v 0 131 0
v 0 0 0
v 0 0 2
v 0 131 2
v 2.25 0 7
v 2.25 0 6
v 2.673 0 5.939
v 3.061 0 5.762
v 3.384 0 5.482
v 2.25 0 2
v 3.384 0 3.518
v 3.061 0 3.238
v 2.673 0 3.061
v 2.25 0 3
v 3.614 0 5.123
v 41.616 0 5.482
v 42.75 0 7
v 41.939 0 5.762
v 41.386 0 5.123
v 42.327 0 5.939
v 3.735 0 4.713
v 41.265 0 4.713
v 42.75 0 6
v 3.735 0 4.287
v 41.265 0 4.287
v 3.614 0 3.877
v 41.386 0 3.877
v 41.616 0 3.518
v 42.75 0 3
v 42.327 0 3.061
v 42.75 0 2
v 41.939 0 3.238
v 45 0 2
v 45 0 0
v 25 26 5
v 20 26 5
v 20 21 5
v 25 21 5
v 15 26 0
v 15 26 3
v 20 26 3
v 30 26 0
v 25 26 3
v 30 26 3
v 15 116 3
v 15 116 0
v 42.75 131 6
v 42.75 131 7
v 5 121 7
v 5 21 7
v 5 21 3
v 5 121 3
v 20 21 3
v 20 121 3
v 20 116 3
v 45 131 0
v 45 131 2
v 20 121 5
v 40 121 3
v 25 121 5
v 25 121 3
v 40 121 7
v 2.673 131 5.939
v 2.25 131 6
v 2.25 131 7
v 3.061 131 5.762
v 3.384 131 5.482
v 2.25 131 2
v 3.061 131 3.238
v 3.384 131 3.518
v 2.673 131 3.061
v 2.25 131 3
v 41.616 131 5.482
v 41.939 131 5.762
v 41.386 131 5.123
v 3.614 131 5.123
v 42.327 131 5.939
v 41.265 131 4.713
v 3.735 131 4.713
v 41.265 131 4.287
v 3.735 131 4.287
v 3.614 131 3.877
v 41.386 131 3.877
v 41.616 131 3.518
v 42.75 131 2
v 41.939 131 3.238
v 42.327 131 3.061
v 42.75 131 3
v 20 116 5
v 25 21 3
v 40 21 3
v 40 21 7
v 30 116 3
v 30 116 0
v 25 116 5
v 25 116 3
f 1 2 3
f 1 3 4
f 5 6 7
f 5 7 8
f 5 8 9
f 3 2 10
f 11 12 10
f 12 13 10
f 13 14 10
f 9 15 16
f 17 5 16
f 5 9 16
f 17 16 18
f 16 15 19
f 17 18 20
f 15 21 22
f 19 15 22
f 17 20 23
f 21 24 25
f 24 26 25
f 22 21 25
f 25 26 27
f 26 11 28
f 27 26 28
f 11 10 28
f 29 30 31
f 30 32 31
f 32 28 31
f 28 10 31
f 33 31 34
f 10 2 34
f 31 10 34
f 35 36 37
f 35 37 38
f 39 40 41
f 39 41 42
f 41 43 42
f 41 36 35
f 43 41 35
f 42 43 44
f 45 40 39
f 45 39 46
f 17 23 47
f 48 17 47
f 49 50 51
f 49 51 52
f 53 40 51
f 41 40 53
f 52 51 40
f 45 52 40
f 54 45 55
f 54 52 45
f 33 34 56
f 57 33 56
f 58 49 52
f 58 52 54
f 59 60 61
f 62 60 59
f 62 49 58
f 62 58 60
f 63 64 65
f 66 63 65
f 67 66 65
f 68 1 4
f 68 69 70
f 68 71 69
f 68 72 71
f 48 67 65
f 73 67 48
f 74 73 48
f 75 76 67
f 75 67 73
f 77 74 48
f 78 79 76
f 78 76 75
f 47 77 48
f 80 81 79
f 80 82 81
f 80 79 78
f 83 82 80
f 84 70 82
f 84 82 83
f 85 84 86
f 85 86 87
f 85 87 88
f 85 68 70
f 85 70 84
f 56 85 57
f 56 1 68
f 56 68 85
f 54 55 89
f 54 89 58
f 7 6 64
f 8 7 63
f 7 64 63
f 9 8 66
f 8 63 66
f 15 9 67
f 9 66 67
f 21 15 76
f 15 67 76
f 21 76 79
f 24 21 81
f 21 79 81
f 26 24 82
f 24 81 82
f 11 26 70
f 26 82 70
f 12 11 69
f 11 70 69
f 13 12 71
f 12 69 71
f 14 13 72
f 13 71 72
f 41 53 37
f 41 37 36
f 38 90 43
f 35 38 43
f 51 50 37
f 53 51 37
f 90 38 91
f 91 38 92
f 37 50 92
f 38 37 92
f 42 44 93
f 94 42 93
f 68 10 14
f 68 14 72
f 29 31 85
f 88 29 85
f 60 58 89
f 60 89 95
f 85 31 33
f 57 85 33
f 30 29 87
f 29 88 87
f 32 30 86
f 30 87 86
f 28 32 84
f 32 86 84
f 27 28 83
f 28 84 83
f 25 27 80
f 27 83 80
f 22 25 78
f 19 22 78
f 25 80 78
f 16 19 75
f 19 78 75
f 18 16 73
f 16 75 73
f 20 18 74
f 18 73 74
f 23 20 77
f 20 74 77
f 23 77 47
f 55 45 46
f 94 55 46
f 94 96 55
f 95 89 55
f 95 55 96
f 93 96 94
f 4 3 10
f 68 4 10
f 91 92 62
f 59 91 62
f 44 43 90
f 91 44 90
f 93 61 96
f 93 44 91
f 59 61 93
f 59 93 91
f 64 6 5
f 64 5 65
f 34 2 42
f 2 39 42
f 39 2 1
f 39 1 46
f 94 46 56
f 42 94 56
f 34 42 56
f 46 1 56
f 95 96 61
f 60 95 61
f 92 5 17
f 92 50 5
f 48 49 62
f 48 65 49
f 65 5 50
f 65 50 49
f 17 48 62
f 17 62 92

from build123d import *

# Parameters (mm, degrees)
F0_W      = 45
F0_H      = 131
F1_DEPTH  = 2
F2_W      = 40.5
F2_H      = 131
F3_DEPTH  = 5
F5_W      = 35
F5_H      = 100
F6_DEPTH  = 4
F7_W      = 5
F7_H      = 100
F8_DEPTH  = 2
F4_W      = 15
F4_H      = 90
F9_DEPTH  = 7.001
F10_R     = 1.5
F11_DEPTH = 131.001


with BuildPart() as f1:
    # F0 (on Top) → F1 (new body)
    with BuildSketch(Plane.XY):
        with Locations((22.5, 65.5)):
            Rectangle(F0_W, F0_H)
    extrude(amount=F1_DEPTH)

    # F2 (on face) → F3 (join)
    with BuildSketch(Plane.XY.offset(2)):
        with Locations((22.5, 65.5)):
            Rectangle(F2_W, F2_H)
    extrude(amount=F3_DEPTH)

    # F5 (on face) → F6 (cut)
    with BuildSketch(Plane.XY.offset(7)):
        with Locations((22.5, 71)):
            Rectangle(F5_W, F5_H)
    extrude(amount=-F6_DEPTH, mode=Mode.SUBTRACT)

    # F7 (on face) → F8 (join)
    with BuildSketch(Plane.XY.offset(3)):
        with Locations((22.5, 71)):
            Rectangle(F7_W, F7_H)
    extrude(amount=F8_DEPTH)

    # F4 (on face) → F9 (cut, through all)
    with BuildSketch(Plane.XY.offset(7)):
        with Locations((22.5, 71)):
            Rectangle(F4_W, F4_H)
    extrude(amount=-F9_DEPTH, mode=Mode.SUBTRACT)

    # F10 (on face) → F11 (cut, through all)
    with BuildSketch(Plane(origin=(0, 131, 0), x_dir=(-1, 0, 0), z_dir=(0, 1, 0))):
        with Locations((-42.75, 4.5)):
            Circle(F10_R)
        with Locations((-2.25, 4.5)):
            Circle(F10_R)
    extrude(amount=-F11_DEPTH, mode=Mode.SUBTRACT)


solid = f1.part
